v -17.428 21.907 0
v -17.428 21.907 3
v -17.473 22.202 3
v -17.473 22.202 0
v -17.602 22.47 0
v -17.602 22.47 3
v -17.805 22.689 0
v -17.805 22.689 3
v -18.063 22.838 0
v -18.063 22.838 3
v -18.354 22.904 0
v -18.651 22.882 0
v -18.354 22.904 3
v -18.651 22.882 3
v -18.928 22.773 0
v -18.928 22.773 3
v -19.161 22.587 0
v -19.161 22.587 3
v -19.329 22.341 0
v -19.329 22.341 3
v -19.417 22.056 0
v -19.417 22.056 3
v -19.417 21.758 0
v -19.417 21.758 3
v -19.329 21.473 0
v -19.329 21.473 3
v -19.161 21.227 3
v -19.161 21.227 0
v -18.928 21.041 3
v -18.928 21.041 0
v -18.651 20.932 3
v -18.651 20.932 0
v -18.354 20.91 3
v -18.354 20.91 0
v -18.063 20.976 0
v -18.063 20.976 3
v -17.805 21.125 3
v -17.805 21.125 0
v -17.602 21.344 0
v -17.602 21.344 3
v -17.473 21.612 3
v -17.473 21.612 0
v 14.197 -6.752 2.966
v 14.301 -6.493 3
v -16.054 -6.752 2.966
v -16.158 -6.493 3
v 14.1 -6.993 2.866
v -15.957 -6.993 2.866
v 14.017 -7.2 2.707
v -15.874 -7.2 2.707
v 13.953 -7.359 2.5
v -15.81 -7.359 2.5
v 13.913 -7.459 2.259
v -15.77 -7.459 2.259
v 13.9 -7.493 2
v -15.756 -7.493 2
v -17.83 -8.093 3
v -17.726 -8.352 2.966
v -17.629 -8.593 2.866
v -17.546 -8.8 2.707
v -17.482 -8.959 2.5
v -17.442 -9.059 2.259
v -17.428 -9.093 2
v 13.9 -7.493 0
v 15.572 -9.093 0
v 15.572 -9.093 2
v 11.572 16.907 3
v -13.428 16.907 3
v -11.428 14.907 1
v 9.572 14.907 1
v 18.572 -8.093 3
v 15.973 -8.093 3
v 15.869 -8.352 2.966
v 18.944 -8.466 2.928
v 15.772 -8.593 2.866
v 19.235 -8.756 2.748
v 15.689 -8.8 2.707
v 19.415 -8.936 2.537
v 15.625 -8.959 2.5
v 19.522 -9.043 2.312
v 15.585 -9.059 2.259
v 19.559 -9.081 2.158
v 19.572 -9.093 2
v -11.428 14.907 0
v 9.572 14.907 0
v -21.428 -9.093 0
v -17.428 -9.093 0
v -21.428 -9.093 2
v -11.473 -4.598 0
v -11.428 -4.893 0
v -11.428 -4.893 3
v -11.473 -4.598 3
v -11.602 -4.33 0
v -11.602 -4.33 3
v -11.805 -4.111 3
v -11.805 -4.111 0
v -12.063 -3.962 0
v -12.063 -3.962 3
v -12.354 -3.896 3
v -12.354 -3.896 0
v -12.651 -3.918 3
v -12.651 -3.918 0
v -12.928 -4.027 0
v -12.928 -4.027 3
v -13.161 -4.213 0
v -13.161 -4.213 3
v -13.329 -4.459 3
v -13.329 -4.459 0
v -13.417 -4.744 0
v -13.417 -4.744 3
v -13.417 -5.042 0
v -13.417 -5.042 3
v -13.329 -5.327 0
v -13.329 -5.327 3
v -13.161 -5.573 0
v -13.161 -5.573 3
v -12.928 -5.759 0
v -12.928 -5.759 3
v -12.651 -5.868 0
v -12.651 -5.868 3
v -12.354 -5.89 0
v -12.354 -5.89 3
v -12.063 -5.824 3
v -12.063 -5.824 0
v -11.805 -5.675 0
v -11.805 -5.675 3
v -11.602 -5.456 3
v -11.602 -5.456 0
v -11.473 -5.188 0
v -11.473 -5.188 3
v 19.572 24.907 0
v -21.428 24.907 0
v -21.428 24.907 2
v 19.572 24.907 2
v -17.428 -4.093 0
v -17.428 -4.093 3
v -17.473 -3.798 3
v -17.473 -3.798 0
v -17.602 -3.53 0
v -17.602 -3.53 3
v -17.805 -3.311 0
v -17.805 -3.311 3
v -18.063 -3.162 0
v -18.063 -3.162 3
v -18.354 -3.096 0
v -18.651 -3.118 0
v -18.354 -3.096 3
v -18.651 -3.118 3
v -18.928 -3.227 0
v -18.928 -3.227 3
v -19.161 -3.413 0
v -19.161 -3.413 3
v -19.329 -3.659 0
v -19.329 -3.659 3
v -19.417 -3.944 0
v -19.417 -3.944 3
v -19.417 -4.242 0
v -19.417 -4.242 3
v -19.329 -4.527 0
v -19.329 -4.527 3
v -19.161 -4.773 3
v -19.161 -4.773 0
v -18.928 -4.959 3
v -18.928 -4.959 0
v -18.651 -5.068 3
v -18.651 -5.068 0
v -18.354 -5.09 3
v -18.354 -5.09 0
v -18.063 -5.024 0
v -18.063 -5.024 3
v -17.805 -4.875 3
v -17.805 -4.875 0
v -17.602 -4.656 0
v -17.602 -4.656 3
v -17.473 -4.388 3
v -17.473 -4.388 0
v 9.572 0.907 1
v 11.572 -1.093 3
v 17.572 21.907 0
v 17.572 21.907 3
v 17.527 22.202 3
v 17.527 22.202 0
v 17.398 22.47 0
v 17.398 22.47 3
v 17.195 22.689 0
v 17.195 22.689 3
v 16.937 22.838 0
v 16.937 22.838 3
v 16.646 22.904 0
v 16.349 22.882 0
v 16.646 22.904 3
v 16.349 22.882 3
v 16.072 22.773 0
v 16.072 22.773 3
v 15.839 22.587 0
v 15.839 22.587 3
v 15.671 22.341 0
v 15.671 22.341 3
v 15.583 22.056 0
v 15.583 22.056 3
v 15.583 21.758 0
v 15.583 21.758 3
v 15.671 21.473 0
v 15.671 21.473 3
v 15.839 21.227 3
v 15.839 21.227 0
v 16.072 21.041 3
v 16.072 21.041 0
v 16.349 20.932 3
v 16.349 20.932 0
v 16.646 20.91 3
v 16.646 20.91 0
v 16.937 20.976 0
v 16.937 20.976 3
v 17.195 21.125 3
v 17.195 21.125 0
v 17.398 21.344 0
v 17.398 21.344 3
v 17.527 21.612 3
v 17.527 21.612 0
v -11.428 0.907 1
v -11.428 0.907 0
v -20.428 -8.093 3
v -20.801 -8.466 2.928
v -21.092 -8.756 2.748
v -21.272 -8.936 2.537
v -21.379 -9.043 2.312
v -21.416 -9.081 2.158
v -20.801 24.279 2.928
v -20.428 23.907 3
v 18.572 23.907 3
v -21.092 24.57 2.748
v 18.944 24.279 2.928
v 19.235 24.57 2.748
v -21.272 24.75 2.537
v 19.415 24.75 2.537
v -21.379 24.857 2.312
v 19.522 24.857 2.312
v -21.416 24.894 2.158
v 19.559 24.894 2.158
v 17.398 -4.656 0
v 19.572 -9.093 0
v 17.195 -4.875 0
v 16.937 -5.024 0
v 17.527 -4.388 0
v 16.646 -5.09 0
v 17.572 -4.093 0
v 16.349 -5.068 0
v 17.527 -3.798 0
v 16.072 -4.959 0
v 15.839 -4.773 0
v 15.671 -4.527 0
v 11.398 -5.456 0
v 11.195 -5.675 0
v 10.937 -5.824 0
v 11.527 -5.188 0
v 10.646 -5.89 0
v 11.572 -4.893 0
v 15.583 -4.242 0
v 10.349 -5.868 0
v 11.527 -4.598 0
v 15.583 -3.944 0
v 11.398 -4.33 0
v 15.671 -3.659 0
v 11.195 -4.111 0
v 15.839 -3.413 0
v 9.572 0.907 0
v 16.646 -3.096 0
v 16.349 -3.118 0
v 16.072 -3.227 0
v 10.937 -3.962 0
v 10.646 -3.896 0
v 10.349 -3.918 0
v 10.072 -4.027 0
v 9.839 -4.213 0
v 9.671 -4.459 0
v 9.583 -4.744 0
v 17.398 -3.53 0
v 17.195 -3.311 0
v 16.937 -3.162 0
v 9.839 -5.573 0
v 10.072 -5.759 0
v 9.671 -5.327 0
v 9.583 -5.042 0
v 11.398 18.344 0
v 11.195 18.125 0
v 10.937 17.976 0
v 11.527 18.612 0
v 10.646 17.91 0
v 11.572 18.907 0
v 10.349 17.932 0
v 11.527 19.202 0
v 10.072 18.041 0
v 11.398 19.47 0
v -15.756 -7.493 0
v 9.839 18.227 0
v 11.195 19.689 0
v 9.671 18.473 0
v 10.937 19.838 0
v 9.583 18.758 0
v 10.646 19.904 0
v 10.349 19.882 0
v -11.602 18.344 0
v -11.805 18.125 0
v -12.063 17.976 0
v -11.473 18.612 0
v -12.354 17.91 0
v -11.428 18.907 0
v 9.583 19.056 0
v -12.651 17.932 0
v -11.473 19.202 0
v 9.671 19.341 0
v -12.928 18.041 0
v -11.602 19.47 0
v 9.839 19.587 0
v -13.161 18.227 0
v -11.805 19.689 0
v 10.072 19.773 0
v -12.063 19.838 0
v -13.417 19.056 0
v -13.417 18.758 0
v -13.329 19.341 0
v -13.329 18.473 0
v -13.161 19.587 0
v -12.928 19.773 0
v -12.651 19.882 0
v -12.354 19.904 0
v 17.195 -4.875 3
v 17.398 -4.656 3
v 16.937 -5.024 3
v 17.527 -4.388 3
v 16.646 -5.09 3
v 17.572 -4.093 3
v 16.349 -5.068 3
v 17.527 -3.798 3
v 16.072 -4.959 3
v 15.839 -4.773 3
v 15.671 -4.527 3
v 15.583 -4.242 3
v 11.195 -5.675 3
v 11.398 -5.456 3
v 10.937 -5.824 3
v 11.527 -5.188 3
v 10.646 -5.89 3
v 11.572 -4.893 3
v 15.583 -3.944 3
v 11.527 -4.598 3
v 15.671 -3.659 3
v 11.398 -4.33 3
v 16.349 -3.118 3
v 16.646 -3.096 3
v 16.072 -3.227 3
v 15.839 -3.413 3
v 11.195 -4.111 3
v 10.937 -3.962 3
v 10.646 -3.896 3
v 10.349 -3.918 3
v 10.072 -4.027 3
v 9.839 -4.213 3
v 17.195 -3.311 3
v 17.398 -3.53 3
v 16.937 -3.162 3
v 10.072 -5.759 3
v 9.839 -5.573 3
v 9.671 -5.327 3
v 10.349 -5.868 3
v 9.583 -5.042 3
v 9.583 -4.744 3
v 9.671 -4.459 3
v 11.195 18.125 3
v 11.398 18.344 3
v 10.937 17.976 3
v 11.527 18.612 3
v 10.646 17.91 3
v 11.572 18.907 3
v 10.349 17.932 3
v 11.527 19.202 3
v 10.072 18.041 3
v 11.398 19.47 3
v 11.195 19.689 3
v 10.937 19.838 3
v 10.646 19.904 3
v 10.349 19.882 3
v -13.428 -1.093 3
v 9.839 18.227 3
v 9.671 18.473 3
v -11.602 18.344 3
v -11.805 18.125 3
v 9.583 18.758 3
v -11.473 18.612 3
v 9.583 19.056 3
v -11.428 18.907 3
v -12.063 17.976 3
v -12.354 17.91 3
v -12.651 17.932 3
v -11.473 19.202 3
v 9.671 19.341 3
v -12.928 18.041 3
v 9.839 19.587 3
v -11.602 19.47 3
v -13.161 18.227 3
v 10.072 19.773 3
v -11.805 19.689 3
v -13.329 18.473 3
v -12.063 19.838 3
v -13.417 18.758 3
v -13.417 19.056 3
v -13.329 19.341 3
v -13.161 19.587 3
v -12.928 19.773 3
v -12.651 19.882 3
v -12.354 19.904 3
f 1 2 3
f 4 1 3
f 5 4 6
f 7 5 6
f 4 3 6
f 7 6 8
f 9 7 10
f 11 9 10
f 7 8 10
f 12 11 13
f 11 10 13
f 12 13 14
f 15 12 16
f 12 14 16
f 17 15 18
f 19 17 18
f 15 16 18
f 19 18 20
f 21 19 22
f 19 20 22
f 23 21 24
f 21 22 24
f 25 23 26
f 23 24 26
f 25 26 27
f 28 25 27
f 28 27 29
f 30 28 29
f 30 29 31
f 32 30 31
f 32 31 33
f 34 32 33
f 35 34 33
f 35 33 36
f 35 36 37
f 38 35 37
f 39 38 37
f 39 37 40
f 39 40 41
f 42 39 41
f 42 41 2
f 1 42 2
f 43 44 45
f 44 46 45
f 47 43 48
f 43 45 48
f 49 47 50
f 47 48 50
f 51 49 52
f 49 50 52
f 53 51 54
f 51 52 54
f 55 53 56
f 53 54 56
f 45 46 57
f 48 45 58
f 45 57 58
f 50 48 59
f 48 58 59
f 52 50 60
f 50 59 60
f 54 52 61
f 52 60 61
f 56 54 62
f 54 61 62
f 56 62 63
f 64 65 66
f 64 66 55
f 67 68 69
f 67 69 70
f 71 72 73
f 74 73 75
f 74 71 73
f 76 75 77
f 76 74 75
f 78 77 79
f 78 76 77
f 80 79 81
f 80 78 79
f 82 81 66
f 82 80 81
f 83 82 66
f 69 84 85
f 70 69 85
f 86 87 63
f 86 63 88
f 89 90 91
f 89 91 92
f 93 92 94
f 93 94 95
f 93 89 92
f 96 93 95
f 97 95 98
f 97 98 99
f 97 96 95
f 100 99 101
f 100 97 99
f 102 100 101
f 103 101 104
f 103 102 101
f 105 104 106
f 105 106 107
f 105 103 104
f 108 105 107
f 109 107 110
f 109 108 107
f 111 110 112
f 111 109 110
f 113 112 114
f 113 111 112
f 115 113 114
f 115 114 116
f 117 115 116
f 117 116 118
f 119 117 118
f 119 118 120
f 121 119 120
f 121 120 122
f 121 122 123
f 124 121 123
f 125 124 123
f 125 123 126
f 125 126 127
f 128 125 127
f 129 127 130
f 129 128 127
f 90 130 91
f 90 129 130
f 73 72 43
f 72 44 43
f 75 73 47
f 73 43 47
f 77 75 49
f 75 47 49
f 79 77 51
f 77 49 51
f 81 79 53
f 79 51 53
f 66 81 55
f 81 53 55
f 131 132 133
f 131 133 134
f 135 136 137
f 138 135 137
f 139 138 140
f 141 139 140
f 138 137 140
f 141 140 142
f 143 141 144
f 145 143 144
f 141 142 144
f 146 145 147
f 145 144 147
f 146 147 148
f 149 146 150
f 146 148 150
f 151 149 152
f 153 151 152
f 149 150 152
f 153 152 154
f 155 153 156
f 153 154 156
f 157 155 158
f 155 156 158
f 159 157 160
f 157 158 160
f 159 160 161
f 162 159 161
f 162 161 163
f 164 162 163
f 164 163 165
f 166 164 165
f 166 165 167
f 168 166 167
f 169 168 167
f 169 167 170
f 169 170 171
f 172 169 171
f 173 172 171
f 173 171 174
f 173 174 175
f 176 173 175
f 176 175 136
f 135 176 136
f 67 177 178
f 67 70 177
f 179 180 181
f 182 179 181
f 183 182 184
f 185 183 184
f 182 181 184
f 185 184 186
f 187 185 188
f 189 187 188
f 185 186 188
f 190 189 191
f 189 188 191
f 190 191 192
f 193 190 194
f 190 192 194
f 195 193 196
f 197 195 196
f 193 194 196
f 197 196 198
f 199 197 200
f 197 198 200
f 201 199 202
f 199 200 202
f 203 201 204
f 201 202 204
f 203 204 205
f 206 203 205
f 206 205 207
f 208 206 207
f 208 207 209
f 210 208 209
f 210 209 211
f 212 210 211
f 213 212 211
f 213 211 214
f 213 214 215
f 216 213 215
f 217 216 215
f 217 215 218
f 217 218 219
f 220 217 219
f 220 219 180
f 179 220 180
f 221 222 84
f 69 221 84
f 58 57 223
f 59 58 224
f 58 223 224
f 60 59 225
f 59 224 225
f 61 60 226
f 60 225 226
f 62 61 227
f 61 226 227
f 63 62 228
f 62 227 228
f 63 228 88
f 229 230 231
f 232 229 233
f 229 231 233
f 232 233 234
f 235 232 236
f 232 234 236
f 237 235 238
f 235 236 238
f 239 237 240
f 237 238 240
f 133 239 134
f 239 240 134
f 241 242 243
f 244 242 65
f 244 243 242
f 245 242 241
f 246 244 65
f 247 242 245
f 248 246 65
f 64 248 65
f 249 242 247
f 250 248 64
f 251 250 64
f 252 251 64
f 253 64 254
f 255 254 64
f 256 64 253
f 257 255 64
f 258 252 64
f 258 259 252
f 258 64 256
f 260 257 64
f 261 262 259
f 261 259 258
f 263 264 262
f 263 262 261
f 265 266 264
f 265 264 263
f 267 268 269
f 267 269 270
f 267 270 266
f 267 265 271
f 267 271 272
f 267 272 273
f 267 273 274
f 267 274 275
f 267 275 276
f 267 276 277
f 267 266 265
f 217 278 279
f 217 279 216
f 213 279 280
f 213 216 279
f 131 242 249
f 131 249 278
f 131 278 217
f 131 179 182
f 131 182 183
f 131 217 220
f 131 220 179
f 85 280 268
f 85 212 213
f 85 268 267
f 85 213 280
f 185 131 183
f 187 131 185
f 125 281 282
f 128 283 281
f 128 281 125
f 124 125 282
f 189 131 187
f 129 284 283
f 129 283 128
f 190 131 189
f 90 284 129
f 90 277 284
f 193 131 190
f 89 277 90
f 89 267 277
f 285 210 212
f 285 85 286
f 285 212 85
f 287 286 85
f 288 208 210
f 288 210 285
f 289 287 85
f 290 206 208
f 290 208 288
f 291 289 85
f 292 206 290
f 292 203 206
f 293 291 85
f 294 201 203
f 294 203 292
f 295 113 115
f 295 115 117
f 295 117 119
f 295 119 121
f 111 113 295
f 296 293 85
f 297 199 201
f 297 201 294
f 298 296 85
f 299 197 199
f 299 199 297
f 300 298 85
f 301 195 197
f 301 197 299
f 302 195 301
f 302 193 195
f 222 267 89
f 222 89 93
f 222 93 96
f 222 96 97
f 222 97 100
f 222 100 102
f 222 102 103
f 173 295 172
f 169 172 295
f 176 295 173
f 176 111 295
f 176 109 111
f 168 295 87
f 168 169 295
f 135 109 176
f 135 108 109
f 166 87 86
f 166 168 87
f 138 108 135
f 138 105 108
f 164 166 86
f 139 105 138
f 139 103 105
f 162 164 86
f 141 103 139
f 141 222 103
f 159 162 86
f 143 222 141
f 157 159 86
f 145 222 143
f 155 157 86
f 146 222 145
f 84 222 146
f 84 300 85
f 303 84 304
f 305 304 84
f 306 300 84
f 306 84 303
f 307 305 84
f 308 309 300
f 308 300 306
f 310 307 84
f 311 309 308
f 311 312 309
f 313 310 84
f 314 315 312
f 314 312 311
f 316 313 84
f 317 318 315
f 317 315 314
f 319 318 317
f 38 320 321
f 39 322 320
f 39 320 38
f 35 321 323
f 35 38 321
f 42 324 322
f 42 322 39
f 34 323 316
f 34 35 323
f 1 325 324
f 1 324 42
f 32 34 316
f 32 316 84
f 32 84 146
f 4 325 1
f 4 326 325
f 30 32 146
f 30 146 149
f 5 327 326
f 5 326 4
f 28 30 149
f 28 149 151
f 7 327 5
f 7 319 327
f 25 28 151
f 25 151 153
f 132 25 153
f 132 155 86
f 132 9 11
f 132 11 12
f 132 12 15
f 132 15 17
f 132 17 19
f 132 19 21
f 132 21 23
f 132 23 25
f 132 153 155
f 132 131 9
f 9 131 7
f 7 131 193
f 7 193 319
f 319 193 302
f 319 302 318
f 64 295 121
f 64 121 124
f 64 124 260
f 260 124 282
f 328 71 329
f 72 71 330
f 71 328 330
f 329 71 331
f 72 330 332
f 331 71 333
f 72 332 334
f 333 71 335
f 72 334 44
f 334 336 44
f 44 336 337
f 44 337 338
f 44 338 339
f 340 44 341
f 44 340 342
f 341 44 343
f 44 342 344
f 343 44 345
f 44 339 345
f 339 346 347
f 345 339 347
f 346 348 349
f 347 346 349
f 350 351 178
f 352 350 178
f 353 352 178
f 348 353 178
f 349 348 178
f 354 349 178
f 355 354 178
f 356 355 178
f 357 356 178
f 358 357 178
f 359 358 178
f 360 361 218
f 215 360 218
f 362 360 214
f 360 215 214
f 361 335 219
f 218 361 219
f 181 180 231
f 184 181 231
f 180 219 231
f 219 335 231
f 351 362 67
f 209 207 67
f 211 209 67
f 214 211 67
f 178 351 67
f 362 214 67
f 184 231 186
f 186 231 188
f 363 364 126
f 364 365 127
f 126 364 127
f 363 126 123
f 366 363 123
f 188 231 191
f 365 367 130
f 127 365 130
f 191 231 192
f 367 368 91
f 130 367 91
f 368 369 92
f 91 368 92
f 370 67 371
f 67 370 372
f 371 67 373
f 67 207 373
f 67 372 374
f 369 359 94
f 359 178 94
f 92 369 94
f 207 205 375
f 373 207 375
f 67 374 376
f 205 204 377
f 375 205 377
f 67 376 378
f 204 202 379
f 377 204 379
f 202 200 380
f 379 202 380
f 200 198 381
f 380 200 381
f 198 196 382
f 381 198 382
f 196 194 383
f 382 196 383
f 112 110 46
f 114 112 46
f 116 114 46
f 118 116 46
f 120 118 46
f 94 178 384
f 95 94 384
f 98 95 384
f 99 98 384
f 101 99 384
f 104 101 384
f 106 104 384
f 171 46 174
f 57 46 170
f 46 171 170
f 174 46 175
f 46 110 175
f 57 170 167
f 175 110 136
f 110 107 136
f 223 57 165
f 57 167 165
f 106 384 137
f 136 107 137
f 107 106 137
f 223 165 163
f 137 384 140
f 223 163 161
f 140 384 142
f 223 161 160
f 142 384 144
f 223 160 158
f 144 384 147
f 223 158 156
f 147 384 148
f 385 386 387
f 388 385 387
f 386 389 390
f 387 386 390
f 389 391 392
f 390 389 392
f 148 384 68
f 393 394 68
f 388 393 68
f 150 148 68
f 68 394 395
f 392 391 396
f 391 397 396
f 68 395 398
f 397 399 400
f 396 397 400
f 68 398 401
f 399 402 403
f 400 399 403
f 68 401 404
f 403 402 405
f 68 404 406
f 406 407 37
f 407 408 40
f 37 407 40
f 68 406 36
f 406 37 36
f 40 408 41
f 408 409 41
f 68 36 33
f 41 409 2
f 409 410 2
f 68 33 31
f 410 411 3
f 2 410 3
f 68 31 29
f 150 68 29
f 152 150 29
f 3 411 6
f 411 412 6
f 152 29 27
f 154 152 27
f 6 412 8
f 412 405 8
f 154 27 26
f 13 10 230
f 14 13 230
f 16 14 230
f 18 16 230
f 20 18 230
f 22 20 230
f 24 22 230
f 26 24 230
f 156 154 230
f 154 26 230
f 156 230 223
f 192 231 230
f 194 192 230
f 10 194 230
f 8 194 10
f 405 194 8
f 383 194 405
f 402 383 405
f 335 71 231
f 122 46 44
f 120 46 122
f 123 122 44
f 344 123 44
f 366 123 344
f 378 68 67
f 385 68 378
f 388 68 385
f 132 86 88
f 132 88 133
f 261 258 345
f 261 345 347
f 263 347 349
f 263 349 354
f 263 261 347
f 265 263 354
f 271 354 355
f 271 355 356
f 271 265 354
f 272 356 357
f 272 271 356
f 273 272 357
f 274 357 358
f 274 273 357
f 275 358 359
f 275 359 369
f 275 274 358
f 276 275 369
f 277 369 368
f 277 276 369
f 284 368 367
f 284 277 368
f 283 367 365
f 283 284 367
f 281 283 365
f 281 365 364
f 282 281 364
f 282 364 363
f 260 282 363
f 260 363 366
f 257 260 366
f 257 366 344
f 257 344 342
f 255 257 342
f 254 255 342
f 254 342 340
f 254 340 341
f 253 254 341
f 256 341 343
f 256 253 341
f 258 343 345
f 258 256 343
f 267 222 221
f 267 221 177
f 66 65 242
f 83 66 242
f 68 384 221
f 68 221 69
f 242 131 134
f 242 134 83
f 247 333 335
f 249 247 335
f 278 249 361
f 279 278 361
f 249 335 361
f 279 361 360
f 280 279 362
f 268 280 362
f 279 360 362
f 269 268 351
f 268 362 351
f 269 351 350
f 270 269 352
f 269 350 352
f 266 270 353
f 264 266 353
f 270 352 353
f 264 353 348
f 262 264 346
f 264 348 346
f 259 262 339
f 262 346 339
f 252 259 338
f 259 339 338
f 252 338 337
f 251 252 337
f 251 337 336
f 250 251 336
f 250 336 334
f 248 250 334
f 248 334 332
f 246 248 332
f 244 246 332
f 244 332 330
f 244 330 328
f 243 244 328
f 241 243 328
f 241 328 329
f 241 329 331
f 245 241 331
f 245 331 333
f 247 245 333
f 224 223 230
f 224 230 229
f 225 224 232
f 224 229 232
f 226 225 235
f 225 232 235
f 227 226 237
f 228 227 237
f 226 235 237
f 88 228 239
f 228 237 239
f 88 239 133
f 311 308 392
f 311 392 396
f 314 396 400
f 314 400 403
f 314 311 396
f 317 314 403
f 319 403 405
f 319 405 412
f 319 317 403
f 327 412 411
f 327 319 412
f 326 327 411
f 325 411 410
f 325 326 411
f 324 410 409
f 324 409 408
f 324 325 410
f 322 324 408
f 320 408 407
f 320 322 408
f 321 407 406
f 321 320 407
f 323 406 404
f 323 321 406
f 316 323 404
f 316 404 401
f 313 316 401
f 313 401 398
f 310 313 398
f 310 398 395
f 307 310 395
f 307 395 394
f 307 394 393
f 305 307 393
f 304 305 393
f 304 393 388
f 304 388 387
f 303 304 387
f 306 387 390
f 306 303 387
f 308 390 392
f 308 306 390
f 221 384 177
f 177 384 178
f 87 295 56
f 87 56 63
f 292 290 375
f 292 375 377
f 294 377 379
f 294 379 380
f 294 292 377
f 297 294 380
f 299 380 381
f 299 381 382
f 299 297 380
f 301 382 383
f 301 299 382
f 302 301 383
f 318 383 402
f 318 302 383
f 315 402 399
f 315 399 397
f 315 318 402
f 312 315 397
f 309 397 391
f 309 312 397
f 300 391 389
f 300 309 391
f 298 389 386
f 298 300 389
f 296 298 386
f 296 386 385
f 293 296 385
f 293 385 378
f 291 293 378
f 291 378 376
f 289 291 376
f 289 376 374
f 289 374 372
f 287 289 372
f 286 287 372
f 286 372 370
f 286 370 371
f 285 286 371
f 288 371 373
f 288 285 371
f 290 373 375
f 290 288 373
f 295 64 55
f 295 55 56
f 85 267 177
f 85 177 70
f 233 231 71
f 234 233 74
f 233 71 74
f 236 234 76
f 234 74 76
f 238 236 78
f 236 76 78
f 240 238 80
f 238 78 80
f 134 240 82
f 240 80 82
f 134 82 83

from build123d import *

# Parameters (mm, degrees)
SKETCH_1_R          = 1
SKETCH_1_W          = 21
SKETCH_1_H          = 14
EXTRUDE_1_DEPTH     = 3
CHAMFER_1_SIZE      = 2
FILLET_2_R          = 1
SKETCH_11_R         = 1
CUT_EXTRUDE_1_DEPTH = 33.992893462


with BuildPart() as part:
    # 草图1 → 凸台-拉伸1 (new body)
    with BuildSketch(Plane.XY):
        Polygon((-21.428351104, 24.906962627), (19.571648896, 24.906962627), (19.571648896, -9.093037373), (17.69677195, -9.093037373), (15.571648896, -9.093037373), (13.89965532, -7.493037373), (-15.756357529, -7.493037373), (-17.428351104, -9.093037373), (-21.428351104, -9.093037373), align=None)
        with Locations((-12.428351104, 18.906962627)):
            Circle(SKETCH_1_R, mode=Mode.SUBTRACT)
        with Locations((-12.428351104, -4.893037373)):
            Circle(SKETCH_1_R, mode=Mode.SUBTRACT)
        with Locations((10.571648896, 18.906962627)):
            Circle(SKETCH_1_R, mode=Mode.SUBTRACT)
        with Locations((10.571648896, -4.893037373)):
            Circle(SKETCH_1_R, mode=Mode.SUBTRACT)
        with Locations((-0.928351104, 7.906962627)):
            Rectangle(SKETCH_1_W, SKETCH_1_H, mode=Mode.SUBTRACT)
    extrude(amount=EXTRUDE_1_DEPTH)

    # 倒角1
    chamfer_1_edges = [part.edges().sort_by_distance(p)[0] for p in [
        (-11.428351104, 7.906962627, 3),
        (-0.928351104, 0.906962627, 3),
        (9.571648896, 7.906962627, 3),
        (-0.928351104, 14.906962627, 3),
    ]]
    chamfer(chamfer_1_edges, length=CHAMFER_1_SIZE)

    # 圆角2
    fillet_2_edges = [part.edges().sort_by_distance(p)[0] for p in [
        (-16.592354317, -8.293037373, 3),
        (-0.928351104, -7.493037373, 3),
        (14.735652108, -8.293037373, 3),
        (17.571648896, -9.093037373, 3),
        (19.571648896, 7.906962627, 3),
        (-0.928351104, 24.906962627, 3),
        (-21.428351104, 7.906962627, 3),
        (-19.428351104, -9.093037373, 3),
    ]]
    fillet(fillet_2_edges, radius=FILLET_2_R)

    # 草图11 → 切除-拉伸1 (cut, through all)
    with BuildSketch(Plane.XY.offset(3)):
        with Locations((-18.428351104, 21.906962627)):
            Circle(SKETCH_11_R)
        with Locations((-18.428351104, -4.093037373)):
            Circle(SKETCH_11_R)
        with Locations((16.571648896, 21.906962627)):
            Circle(SKETCH_11_R)
        with Locations((16.571648896, -4.093037373)):
            Circle(SKETCH_11_R)
    extrude(amount=-CUT_EXTRUDE_1_DEPTH, mode=Mode.SUBTRACT)


solid = part.part
